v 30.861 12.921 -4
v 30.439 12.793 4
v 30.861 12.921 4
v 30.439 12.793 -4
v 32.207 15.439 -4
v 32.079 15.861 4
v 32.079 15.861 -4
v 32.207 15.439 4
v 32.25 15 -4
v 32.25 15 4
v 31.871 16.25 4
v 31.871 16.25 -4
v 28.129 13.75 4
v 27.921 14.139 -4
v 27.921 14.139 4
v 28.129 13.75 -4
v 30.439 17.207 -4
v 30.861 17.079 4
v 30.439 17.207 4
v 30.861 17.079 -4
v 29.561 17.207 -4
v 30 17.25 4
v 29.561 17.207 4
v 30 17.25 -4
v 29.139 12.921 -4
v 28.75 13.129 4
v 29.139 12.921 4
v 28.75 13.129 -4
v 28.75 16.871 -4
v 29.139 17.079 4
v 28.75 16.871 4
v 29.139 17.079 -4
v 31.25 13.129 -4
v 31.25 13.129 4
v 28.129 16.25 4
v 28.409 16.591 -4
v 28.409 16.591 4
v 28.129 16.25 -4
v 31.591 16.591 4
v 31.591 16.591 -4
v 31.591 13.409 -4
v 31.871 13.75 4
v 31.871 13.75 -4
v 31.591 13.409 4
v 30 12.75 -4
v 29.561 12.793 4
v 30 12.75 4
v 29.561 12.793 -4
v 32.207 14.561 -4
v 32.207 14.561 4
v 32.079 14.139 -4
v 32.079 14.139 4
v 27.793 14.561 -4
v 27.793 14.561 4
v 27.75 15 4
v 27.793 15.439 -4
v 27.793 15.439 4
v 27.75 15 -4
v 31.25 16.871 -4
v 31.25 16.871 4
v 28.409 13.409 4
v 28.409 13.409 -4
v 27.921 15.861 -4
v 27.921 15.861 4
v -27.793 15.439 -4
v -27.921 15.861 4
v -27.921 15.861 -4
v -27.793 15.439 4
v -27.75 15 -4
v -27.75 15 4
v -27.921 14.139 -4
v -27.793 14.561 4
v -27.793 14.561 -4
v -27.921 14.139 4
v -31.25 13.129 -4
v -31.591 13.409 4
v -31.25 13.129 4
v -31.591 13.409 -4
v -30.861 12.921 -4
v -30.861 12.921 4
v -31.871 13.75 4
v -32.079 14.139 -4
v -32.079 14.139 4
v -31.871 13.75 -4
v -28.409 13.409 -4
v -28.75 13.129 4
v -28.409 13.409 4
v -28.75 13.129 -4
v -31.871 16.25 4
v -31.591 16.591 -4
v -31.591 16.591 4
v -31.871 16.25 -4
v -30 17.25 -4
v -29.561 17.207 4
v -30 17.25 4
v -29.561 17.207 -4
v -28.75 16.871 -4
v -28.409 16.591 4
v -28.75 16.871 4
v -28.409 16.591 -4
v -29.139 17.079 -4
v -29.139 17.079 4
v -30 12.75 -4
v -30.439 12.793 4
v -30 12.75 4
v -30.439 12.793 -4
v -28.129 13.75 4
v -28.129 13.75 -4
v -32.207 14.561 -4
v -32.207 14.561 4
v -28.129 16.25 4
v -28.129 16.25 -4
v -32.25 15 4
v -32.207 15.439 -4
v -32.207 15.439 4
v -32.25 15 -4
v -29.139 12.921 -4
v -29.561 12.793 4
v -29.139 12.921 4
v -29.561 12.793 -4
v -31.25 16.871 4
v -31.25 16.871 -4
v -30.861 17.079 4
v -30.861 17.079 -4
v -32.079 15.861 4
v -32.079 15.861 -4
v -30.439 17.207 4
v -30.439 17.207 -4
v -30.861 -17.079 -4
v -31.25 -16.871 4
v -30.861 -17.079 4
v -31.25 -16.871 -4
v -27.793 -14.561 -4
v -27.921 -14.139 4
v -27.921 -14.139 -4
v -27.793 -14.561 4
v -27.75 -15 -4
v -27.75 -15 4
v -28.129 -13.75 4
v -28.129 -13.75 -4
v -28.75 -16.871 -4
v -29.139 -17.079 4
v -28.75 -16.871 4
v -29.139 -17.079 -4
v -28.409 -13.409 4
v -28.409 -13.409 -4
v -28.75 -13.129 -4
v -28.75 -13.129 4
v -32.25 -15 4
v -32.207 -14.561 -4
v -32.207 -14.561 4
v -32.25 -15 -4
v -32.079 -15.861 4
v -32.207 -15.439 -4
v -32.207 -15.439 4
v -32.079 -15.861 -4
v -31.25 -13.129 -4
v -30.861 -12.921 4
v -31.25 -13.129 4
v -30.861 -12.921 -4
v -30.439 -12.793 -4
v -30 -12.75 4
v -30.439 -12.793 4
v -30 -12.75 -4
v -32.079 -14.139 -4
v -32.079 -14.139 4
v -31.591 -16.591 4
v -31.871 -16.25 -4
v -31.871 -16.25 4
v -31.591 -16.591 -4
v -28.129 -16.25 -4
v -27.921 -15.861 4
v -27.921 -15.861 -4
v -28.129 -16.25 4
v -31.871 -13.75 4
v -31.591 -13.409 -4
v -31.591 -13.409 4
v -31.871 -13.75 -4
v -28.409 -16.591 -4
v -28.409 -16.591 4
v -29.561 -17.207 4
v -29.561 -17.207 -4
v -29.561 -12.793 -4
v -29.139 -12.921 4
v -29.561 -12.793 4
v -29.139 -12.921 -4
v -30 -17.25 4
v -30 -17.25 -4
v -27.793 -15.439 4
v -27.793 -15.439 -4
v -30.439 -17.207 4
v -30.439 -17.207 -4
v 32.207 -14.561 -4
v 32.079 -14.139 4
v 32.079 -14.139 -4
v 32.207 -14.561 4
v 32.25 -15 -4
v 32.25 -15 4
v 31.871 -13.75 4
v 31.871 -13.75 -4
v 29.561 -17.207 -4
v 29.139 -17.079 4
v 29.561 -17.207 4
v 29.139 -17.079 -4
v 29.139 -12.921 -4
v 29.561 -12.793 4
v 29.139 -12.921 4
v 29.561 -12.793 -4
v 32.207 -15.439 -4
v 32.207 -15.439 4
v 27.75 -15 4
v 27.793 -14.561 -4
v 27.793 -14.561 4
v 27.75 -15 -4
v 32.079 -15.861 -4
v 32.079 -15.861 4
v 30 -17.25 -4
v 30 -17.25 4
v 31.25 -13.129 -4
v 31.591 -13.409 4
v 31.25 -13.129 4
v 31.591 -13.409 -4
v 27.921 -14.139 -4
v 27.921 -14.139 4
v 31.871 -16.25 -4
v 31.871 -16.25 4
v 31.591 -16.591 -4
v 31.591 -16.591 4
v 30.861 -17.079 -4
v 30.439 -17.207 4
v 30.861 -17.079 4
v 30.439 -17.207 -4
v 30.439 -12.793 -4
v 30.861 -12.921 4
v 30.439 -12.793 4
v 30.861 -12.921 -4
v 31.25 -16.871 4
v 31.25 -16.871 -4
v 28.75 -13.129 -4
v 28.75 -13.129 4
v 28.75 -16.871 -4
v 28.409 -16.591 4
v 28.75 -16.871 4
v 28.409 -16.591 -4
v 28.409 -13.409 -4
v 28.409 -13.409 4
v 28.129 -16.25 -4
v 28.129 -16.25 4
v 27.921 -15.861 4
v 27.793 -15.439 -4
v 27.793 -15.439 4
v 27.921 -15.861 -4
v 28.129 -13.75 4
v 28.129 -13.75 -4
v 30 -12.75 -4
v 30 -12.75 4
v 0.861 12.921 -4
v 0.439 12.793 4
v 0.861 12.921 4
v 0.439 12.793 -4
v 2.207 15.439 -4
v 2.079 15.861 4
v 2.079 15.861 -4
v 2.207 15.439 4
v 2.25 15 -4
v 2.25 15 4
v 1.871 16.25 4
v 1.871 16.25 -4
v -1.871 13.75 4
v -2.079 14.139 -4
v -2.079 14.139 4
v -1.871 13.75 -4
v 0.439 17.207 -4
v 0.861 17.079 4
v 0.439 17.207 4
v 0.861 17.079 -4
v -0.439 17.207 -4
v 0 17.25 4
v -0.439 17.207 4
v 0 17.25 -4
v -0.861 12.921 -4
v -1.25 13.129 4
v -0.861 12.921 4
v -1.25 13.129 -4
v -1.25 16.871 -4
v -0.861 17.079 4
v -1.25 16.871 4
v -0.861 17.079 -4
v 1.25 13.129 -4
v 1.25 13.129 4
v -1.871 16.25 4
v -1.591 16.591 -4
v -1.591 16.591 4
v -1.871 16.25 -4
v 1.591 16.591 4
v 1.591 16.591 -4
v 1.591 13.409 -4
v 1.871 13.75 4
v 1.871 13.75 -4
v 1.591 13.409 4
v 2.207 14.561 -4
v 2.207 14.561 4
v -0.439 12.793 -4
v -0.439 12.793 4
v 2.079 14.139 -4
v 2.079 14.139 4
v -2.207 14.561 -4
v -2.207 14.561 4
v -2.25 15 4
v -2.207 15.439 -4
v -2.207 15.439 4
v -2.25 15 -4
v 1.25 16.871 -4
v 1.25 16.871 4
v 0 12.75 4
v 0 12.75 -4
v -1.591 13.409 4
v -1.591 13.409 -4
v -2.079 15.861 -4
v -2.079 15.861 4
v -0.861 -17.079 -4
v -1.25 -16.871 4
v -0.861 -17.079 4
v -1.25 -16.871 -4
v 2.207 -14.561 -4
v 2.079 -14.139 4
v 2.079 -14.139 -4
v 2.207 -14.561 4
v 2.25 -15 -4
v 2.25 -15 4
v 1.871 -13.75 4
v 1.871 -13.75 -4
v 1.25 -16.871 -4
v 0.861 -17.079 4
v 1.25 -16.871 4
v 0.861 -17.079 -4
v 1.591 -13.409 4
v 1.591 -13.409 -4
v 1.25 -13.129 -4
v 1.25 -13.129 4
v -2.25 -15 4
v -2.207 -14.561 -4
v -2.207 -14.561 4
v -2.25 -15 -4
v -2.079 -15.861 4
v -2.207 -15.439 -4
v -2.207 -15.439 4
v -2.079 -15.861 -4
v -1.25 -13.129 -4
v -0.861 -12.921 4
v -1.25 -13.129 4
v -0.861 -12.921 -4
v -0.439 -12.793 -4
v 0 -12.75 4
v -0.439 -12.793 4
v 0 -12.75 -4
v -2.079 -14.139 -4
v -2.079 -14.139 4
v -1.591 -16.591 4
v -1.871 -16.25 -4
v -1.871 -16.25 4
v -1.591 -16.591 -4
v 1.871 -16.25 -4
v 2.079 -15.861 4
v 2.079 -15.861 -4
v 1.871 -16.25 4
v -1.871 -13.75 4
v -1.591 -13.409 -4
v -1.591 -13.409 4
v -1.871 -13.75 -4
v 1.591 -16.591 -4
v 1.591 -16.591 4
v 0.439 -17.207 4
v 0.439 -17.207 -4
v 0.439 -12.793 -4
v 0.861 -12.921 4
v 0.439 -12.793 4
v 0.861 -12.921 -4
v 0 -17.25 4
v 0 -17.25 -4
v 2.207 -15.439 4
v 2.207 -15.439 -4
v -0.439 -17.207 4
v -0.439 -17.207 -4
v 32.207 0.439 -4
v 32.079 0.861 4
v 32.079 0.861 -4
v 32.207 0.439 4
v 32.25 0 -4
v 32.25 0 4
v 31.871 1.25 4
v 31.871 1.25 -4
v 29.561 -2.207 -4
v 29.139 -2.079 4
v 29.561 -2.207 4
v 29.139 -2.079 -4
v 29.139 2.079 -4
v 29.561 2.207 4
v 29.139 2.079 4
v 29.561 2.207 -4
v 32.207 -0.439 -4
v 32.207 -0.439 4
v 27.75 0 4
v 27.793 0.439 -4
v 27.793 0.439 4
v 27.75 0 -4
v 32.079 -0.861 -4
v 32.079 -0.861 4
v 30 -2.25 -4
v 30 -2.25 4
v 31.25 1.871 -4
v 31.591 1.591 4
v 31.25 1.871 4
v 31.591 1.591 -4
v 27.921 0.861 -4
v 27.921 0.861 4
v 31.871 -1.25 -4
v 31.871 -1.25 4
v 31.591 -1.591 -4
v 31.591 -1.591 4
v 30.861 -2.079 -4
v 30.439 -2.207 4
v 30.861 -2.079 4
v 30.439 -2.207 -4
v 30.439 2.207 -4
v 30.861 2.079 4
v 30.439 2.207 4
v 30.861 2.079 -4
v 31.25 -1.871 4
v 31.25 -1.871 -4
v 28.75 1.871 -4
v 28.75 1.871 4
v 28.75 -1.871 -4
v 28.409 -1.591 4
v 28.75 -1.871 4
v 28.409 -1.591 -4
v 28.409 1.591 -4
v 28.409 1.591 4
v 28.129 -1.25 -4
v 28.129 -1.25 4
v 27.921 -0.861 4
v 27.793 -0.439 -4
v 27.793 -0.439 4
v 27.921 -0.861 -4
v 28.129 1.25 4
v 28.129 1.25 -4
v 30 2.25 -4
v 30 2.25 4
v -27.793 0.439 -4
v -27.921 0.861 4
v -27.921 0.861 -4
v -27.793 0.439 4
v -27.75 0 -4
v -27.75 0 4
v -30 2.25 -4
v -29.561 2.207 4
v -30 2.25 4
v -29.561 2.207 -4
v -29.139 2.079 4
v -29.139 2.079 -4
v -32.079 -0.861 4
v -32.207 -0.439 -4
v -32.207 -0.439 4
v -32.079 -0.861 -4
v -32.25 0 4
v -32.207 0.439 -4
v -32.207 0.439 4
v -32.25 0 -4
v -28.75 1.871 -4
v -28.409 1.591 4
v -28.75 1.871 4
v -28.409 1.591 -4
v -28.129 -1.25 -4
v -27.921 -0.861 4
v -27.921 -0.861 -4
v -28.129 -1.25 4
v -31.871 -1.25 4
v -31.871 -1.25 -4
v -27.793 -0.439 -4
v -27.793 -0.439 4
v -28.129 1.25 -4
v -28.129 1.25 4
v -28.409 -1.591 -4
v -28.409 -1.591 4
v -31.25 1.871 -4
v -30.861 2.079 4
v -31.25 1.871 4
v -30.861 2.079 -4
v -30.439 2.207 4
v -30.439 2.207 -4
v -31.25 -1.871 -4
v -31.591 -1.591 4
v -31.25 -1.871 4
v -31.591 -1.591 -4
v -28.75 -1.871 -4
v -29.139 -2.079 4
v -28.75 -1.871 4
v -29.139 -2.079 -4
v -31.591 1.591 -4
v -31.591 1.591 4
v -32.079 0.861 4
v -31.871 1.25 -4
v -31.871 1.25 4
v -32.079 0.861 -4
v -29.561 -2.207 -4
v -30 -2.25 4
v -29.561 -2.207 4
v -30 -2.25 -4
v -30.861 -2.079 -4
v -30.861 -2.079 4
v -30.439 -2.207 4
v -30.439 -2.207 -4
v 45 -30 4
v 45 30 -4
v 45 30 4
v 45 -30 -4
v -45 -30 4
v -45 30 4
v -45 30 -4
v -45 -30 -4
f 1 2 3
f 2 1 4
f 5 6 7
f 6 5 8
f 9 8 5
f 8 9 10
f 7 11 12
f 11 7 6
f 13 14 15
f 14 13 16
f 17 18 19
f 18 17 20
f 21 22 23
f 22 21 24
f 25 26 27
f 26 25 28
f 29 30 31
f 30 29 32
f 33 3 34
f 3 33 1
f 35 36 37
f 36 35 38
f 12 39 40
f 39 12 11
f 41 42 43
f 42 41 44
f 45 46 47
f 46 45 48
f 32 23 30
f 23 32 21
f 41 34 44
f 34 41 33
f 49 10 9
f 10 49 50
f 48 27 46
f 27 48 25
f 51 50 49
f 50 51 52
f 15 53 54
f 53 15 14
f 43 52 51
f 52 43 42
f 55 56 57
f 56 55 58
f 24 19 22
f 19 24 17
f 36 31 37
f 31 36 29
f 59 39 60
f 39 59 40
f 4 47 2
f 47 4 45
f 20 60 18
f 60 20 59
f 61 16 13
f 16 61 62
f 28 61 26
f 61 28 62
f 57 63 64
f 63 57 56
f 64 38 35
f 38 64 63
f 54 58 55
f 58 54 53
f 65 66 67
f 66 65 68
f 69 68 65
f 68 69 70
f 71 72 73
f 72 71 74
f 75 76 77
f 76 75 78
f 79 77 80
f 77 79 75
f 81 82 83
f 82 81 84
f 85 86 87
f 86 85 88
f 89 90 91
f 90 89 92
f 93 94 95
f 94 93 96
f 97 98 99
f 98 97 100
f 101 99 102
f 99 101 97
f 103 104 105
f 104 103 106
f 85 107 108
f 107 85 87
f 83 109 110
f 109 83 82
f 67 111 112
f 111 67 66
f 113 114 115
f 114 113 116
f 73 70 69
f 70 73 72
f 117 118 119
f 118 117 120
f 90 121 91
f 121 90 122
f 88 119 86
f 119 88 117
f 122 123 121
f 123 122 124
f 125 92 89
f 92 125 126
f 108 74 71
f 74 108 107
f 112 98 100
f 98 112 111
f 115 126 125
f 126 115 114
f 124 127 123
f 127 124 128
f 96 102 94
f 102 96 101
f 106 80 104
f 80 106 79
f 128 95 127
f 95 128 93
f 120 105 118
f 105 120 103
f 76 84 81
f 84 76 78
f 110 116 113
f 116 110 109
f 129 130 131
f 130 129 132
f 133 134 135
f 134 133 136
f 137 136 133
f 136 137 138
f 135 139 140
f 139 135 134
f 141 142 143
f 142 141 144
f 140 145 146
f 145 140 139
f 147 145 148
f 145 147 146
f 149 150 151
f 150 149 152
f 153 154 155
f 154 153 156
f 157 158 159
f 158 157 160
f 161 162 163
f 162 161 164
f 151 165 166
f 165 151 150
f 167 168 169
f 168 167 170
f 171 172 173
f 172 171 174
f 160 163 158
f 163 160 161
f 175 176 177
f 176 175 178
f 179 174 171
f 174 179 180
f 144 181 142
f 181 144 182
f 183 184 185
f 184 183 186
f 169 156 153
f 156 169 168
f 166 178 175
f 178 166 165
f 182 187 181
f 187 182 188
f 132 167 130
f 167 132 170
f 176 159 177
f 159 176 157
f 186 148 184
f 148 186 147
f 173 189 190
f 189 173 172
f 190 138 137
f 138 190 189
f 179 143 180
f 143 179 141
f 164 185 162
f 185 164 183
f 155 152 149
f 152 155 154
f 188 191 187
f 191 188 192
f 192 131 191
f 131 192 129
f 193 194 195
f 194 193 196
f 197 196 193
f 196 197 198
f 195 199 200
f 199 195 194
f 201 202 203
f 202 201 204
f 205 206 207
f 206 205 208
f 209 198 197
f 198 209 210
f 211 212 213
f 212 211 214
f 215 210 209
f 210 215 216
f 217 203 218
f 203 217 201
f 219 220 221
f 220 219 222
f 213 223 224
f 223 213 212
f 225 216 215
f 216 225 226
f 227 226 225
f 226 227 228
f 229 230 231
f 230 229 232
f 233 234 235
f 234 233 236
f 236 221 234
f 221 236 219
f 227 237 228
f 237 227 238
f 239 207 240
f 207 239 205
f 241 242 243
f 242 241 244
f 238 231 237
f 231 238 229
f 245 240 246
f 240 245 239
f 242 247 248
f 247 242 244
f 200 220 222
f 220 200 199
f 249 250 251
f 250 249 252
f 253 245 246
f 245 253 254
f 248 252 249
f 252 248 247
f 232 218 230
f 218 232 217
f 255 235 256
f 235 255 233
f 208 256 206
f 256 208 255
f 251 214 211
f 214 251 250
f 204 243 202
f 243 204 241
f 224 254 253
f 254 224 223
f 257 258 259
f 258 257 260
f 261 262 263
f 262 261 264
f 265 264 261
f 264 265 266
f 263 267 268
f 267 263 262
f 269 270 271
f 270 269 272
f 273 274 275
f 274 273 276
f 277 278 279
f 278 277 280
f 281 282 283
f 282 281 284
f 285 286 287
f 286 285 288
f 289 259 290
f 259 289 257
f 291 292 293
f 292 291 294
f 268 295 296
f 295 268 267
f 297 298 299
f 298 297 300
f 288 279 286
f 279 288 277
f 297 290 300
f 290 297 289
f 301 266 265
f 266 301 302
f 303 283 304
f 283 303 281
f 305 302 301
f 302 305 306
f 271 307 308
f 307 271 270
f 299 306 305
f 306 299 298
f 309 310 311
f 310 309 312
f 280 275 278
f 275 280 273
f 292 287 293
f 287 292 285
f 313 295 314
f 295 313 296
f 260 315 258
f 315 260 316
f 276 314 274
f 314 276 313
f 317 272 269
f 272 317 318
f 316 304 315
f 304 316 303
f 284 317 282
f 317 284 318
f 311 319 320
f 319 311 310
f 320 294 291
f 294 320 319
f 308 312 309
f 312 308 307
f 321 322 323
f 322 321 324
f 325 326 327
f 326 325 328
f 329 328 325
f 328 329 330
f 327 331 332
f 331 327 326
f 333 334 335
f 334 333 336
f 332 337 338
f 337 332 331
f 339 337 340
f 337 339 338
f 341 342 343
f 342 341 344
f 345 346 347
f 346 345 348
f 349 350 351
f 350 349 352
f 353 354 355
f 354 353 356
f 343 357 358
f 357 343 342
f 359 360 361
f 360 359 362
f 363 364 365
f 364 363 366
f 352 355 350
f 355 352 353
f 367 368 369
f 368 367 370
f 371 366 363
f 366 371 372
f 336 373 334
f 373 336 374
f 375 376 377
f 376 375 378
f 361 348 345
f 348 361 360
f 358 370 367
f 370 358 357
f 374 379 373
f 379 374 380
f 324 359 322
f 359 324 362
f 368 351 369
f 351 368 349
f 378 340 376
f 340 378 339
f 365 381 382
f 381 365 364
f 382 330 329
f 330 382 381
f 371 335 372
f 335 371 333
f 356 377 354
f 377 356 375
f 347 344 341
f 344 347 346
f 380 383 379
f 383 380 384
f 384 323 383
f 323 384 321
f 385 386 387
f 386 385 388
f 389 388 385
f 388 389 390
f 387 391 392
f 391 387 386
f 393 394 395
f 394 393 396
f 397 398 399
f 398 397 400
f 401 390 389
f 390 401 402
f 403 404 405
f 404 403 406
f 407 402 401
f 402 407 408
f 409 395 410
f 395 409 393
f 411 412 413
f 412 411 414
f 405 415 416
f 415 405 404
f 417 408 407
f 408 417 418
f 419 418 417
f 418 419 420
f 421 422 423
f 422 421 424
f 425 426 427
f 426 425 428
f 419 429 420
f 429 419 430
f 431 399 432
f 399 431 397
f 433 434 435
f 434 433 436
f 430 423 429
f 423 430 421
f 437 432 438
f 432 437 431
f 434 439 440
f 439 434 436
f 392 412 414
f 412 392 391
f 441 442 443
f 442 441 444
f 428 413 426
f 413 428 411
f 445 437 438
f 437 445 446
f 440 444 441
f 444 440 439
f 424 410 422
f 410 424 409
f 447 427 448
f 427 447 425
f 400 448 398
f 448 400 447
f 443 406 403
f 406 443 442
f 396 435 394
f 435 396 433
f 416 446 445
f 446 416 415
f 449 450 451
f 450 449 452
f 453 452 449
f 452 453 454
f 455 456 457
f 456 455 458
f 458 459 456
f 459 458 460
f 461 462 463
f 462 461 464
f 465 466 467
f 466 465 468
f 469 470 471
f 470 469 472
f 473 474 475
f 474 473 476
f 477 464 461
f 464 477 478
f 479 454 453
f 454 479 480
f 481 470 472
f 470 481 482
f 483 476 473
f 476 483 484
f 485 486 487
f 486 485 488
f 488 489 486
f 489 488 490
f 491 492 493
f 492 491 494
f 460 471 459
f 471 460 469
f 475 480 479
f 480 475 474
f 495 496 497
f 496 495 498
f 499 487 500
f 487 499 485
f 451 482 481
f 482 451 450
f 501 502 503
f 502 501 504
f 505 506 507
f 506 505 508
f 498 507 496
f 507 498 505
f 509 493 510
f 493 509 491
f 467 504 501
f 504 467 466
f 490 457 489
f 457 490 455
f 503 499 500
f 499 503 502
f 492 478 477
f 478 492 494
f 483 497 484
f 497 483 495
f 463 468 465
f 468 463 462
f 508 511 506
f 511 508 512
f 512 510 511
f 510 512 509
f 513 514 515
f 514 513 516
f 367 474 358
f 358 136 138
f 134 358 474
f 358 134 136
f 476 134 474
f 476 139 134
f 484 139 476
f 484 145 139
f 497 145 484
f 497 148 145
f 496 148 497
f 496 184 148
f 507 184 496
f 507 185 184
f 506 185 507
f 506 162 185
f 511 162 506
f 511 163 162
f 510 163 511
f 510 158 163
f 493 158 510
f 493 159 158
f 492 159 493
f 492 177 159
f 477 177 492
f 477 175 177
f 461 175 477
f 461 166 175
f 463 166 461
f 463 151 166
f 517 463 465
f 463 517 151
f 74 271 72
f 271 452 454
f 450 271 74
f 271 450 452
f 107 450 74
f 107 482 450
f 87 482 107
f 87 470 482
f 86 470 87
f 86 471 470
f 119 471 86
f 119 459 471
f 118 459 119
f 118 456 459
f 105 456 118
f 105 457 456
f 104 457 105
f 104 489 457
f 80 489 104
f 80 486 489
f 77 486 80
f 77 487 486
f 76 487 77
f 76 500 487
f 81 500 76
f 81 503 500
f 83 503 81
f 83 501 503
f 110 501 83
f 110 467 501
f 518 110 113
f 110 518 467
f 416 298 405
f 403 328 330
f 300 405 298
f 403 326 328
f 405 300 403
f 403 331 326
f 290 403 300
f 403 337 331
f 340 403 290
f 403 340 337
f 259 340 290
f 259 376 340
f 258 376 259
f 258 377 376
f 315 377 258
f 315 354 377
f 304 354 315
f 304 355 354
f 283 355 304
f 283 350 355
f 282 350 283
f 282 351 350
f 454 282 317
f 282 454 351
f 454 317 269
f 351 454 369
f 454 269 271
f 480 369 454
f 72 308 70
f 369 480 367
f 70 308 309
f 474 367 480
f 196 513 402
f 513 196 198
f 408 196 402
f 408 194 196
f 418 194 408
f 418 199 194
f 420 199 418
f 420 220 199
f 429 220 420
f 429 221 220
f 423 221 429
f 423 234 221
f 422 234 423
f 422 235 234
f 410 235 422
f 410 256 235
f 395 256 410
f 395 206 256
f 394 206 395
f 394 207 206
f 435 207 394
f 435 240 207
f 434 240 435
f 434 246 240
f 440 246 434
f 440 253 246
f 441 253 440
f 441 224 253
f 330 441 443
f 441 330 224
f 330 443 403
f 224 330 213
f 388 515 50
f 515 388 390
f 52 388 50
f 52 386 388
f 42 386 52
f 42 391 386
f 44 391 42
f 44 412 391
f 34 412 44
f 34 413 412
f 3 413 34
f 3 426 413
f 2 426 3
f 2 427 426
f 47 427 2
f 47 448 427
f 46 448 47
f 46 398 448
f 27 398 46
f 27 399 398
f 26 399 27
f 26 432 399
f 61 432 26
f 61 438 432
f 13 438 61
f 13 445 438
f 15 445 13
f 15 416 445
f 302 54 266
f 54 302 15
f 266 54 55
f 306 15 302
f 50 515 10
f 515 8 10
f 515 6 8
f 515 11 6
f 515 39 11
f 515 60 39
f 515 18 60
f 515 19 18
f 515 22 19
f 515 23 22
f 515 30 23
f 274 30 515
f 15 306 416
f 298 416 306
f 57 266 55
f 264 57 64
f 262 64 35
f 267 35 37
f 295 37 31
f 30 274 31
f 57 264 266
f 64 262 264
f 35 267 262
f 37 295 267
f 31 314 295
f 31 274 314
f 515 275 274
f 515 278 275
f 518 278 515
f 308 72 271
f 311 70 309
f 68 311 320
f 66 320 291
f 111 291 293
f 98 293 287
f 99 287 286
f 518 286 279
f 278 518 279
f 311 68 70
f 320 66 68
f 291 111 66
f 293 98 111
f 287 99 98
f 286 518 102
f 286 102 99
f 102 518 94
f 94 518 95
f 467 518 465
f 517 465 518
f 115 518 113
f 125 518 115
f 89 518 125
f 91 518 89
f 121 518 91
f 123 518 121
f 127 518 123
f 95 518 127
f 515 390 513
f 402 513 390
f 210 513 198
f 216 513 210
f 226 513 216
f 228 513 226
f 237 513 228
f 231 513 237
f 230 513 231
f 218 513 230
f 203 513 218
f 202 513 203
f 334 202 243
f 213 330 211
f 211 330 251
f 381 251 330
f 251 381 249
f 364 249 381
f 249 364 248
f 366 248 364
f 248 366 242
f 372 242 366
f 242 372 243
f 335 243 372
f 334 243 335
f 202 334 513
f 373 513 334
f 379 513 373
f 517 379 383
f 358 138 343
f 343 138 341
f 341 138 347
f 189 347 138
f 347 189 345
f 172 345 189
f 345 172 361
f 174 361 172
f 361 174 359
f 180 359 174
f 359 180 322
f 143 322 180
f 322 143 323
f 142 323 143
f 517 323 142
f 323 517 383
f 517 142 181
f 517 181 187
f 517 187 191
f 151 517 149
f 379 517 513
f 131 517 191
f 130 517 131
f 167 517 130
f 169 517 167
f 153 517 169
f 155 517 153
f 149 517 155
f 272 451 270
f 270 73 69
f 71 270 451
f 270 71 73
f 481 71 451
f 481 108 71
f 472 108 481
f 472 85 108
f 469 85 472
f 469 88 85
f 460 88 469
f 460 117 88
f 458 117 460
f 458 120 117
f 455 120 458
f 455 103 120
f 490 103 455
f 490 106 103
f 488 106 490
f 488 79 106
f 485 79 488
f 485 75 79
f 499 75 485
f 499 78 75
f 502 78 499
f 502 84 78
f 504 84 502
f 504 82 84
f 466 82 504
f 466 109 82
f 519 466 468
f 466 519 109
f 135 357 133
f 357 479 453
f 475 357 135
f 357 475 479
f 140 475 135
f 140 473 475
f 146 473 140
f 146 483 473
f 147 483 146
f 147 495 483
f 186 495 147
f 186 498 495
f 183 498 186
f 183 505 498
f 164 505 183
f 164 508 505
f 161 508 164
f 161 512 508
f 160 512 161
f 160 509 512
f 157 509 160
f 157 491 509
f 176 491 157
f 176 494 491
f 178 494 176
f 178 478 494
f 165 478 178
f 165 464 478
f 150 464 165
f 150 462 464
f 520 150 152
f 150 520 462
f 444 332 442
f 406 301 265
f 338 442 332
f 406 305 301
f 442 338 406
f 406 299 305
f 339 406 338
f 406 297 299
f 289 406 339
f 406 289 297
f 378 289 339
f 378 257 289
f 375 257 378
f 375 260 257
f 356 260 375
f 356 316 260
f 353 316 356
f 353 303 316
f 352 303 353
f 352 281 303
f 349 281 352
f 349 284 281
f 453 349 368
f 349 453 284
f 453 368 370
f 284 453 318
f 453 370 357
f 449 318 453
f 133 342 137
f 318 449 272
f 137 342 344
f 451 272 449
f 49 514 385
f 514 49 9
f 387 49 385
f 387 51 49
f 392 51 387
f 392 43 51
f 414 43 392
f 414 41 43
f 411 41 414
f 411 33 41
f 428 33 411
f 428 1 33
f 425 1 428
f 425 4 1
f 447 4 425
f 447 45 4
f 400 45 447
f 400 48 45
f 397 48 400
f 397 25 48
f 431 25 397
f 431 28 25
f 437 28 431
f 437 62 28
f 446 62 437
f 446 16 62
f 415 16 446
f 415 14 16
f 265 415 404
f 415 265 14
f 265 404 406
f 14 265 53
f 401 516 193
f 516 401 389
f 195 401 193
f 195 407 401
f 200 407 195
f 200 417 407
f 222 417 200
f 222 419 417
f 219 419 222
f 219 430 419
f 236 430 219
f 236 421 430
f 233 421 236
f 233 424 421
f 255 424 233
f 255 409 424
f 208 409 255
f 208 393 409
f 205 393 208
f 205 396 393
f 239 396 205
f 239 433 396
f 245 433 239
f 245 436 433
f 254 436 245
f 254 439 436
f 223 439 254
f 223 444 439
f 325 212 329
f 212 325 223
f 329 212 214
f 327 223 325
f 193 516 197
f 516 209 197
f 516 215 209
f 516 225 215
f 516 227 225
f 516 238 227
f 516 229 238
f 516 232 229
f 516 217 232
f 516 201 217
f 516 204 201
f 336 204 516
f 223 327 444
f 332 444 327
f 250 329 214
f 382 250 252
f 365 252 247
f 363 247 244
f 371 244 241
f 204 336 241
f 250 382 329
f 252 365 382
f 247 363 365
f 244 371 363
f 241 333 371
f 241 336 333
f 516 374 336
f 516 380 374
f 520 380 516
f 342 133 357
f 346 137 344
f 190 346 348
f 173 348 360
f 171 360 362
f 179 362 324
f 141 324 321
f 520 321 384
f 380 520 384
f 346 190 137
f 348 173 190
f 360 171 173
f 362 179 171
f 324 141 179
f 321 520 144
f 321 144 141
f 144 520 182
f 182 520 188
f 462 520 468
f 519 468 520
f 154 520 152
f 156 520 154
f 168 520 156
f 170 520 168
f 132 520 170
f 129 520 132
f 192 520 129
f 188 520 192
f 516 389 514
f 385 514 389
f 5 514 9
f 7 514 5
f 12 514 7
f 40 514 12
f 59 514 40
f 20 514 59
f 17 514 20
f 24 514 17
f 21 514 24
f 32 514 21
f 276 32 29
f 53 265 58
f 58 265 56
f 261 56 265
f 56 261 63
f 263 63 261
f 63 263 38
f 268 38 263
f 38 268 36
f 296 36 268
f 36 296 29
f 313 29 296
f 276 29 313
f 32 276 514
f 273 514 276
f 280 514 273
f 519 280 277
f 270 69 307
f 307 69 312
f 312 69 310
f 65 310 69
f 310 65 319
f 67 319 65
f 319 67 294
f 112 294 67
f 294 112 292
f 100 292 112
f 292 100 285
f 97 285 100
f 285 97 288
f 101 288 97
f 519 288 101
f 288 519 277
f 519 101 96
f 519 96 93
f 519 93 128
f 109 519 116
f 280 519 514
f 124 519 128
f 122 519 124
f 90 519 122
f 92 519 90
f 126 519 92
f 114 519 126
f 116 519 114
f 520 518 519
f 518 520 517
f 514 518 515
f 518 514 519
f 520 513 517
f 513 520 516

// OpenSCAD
$fn = 32;

// ----------------------------------------------------------------------
// Corner plate 90 x 60 x 8
// 8 holes, centres taken from the edge offset
// ----------------------------------------------------------------------

// --- parameters (mm) ---
plate = [90, 60, 8];  // overall size (x, y, z)
holes = 8;            // number of holes the drawing asks for
hole_d = 4.5;         // hole diameter
edge = 15;            // hole centre offset from the plate edge

// --- derived feature positions (mm) ---
corner_x = plate[0] / 2 - edge;  // = 30   corner hole X
corner_y = plate[1] / 2 - edge;  // = 15   corner hole Y
feature_centers = [
  [corner_x, corner_y],
  [-corner_x, corner_y],
  [-corner_x, -corner_y],
  [corner_x, -corner_y],
  [0, corner_y],
  [0, -corner_y],
  [corner_x, 0],
  [-corner_x, 0]
];   // hole centres the loop below drills

// plate outline, every hole drilled through with the same cutters
difference() {
  cube(plate, center = true);
  for (centre = feature_centers)
    translate([centre[0], centre[1], 0])
      cylinder(d = hole_d, h = plate[2] + 2, center = true);
}
